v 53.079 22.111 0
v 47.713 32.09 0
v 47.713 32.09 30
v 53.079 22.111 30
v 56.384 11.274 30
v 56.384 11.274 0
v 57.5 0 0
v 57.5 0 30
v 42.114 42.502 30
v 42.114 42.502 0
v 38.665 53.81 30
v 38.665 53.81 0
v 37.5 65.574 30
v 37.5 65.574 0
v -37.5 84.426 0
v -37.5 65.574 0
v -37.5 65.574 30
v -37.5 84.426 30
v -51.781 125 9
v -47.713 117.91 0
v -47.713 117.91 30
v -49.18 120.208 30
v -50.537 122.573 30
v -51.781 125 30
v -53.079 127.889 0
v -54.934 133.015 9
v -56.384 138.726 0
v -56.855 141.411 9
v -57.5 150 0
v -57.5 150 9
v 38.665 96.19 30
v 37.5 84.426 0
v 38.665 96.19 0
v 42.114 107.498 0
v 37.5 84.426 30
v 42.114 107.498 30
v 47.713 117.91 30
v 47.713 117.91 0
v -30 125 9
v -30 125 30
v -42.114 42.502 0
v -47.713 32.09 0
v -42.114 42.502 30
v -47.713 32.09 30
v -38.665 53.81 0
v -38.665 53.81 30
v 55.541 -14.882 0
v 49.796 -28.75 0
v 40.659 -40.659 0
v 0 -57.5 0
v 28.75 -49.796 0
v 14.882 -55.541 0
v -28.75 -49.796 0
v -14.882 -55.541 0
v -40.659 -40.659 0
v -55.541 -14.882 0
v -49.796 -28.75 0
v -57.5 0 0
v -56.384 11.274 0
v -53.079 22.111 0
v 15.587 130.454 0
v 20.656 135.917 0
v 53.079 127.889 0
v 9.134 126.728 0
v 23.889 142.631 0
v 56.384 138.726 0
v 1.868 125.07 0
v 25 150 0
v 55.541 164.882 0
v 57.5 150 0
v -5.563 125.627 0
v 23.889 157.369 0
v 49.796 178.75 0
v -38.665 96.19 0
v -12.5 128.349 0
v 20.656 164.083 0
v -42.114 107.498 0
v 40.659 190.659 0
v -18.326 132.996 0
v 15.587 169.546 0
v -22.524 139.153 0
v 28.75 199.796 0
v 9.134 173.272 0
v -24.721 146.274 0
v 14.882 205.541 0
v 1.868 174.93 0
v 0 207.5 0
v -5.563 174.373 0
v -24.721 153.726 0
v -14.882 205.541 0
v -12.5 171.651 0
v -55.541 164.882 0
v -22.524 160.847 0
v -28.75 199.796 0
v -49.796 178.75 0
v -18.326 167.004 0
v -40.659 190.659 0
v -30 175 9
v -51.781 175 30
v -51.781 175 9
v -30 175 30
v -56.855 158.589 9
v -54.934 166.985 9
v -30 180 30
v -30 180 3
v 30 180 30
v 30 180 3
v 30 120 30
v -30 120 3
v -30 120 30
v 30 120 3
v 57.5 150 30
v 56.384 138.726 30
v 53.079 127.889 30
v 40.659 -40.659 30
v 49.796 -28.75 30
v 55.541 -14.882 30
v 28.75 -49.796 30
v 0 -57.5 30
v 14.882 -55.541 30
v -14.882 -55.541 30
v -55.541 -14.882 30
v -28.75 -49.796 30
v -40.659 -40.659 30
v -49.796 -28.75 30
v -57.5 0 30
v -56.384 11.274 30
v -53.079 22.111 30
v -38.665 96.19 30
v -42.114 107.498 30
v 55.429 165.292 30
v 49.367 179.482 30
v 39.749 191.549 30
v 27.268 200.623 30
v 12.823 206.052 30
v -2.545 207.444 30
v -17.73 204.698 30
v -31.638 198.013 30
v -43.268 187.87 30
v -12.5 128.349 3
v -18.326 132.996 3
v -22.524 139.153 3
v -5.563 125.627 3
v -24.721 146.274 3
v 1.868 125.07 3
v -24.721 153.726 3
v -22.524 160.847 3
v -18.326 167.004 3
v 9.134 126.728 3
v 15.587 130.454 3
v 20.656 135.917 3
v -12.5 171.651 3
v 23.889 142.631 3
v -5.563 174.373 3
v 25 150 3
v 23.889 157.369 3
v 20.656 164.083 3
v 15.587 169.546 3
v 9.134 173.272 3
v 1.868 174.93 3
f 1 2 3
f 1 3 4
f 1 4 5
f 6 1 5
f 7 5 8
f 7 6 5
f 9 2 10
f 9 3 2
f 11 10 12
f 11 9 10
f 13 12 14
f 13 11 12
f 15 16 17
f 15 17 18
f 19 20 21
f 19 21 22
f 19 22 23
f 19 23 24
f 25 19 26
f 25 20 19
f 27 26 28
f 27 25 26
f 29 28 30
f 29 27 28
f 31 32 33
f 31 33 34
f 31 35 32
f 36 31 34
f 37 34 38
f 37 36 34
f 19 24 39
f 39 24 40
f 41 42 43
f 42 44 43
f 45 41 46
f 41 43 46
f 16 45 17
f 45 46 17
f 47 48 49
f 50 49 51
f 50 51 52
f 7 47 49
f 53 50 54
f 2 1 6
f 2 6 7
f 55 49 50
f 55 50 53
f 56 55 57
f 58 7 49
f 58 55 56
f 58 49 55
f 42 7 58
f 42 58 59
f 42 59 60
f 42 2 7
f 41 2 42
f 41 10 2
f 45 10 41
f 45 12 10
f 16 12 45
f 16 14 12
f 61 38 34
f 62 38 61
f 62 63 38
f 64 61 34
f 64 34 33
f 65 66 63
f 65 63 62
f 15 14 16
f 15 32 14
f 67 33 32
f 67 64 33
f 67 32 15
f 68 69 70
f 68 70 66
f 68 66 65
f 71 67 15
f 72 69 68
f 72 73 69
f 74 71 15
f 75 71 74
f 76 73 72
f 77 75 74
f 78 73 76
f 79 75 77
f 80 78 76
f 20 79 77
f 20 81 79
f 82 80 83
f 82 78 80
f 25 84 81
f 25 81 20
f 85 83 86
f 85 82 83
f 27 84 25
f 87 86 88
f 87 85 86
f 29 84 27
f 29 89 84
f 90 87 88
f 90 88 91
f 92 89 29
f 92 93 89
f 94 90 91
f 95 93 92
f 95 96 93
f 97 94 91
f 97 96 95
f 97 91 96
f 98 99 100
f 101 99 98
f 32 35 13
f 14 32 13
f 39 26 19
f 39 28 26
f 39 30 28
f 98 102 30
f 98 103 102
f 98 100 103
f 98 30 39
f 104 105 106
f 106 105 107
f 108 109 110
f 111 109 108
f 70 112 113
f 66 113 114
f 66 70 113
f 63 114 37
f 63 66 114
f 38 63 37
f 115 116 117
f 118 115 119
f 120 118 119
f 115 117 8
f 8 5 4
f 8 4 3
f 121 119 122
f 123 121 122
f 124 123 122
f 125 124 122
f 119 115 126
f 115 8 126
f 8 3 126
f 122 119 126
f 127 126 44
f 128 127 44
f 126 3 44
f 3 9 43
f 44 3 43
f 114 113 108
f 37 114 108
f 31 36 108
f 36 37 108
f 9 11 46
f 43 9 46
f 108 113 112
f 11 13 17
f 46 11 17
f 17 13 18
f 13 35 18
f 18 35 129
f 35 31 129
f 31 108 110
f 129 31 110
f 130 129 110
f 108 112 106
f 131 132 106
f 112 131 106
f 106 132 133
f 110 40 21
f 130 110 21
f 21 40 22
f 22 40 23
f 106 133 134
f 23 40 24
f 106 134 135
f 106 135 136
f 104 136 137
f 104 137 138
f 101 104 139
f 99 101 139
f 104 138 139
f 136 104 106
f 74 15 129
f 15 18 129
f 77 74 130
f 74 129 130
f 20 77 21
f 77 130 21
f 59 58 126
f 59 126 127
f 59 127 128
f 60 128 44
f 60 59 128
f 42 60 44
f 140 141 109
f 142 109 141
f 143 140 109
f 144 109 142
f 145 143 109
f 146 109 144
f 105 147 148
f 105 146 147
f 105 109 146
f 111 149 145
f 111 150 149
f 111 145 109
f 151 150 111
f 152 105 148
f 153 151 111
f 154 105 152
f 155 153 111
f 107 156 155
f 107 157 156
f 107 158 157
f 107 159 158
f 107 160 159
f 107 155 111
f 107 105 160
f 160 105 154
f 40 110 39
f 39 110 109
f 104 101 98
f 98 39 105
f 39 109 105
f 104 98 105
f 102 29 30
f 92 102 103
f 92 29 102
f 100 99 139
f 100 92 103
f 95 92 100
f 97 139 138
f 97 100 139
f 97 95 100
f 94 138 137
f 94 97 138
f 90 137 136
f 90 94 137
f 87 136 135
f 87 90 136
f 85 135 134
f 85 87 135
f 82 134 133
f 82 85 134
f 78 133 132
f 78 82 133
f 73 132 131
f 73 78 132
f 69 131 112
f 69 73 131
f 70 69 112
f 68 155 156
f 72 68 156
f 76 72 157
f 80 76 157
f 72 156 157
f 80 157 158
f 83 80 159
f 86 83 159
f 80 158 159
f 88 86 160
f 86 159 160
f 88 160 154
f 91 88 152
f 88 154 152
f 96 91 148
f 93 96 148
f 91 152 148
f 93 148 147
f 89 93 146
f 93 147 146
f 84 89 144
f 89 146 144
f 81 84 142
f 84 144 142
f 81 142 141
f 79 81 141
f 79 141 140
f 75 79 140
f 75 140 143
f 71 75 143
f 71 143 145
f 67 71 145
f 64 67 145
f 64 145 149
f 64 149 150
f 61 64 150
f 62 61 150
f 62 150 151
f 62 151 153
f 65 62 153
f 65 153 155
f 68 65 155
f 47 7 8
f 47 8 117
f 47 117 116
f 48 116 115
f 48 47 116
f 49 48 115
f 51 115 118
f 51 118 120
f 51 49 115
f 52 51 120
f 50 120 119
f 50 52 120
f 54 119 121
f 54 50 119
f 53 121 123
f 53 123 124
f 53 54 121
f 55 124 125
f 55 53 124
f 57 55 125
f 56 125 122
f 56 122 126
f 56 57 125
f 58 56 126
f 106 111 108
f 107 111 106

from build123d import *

# Parameters (mm, degrees)
BOSS_EXTRUDE1_DEPTH = 30
CUT_EXTRUDE1_DEPTH  = 35
FILLET1_R           = 60
SKETCH6_R           = 25
CUT_EXTRUDE2_DEPTH  = 31
CUT_EXTRUDE3_START  = -27
SKETCH7_W           = 60
SKETCH7_H           = 60
CUT_EXTRUDE3_DEPTH  = 27
SKETCH8_W           = 27.5
SKETCH8_H           = 50
CUT_EXTRUDE4_DEPTH  = 21


with BuildPart() as part:
    # Sketch3 → Boss-Extrude1 (new body)
    with BuildSketch(Plane.XY):
        with BuildLine():
            Line((-57.5, 0), (-57.5, 150))
            ThreePointArc((-57.5, 150), (0, 207.5), (57.5, 150))
            Line((57.5, 150), (57.5, 0))
            ThreePointArc((57.5, 0), (0, -57.5), (-57.5, 0))
        make_face()
    extrude(amount=BOSS_EXTRUDE1_DEPTH)

    # Sketch4 → Cut-Extrude1 (cut)
    with BuildSketch(Plane(origin=(0, 0, 0), x_dir=(-1, 0, 0), z_dir=(0, 0, -1))):
        with BuildLine():
            ThreePointArc((-57.5, 150), (-52.261362401, 126.020842383), (-37.5, 106.411010565))
            Line((-37.5, 106.411010565), (-37.5, 43.588989435))
            ThreePointArc((-37.5, 43.588989435), (-52.261362401, 23.979157617), (-57.5, 0))
            Line((-57.5, 0), (-57.5, 150))
        make_face()
        with BuildLine():
            ThreePointArc((57.5, 0), (52.261362401, 23.979157617), (37.5, 43.588989435))
            Line((37.5, 43.588989435), (37.5, 106.411010565))
            ThreePointArc((37.5, 106.411010565), (52.261362401, 126.020842383), (57.5, 150))
            Line((57.5, 150), (57.5, 0))
        make_face()
    extrude(amount=-CUT_EXTRUDE1_DEPTH, mode=Mode.SUBTRACT)

    # Fillet1
    fillet1_edges = [part.edges().sort_by_distance(p)[0] for p in [
        (37.5, 106.411010565, 15),
        (37.5, 43.588989435, 15),
        (-37.5, 43.588989435, 15),
        (-37.5, 106.411010565, 15),
    ]]
    fillet(fillet1_edges, radius=FILLET1_R)

    # Sketch6 → Cut-Extrude2 (cut, through all)
    with BuildSketch(Plane.XY.offset(30)):
        with Locations((0, 150)):
            Circle(SKETCH6_R)
    extrude(amount=-CUT_EXTRUDE2_DEPTH, mode=Mode.SUBTRACT)

    # Sketch7 → Cut-Extrude3 (cut)
    with BuildSketch(Plane.XY.offset(30).offset(CUT_EXTRUDE3_START)):
        with Locations((0, 150)):
            Rectangle(SKETCH7_W, SKETCH7_H)
    extrude(amount=CUT_EXTRUDE3_DEPTH, mode=Mode.SUBTRACT)

    # Sketch8 → Cut-Extrude4 (cut)
    with BuildSketch(Plane.XY.offset(30)):
        with Locations((-43.75, 150)):
            Rectangle(SKETCH8_W, SKETCH8_H)
    extrude(amount=-CUT_EXTRUDE4_DEPTH, mode=Mode.SUBTRACT)


solid = part.part
